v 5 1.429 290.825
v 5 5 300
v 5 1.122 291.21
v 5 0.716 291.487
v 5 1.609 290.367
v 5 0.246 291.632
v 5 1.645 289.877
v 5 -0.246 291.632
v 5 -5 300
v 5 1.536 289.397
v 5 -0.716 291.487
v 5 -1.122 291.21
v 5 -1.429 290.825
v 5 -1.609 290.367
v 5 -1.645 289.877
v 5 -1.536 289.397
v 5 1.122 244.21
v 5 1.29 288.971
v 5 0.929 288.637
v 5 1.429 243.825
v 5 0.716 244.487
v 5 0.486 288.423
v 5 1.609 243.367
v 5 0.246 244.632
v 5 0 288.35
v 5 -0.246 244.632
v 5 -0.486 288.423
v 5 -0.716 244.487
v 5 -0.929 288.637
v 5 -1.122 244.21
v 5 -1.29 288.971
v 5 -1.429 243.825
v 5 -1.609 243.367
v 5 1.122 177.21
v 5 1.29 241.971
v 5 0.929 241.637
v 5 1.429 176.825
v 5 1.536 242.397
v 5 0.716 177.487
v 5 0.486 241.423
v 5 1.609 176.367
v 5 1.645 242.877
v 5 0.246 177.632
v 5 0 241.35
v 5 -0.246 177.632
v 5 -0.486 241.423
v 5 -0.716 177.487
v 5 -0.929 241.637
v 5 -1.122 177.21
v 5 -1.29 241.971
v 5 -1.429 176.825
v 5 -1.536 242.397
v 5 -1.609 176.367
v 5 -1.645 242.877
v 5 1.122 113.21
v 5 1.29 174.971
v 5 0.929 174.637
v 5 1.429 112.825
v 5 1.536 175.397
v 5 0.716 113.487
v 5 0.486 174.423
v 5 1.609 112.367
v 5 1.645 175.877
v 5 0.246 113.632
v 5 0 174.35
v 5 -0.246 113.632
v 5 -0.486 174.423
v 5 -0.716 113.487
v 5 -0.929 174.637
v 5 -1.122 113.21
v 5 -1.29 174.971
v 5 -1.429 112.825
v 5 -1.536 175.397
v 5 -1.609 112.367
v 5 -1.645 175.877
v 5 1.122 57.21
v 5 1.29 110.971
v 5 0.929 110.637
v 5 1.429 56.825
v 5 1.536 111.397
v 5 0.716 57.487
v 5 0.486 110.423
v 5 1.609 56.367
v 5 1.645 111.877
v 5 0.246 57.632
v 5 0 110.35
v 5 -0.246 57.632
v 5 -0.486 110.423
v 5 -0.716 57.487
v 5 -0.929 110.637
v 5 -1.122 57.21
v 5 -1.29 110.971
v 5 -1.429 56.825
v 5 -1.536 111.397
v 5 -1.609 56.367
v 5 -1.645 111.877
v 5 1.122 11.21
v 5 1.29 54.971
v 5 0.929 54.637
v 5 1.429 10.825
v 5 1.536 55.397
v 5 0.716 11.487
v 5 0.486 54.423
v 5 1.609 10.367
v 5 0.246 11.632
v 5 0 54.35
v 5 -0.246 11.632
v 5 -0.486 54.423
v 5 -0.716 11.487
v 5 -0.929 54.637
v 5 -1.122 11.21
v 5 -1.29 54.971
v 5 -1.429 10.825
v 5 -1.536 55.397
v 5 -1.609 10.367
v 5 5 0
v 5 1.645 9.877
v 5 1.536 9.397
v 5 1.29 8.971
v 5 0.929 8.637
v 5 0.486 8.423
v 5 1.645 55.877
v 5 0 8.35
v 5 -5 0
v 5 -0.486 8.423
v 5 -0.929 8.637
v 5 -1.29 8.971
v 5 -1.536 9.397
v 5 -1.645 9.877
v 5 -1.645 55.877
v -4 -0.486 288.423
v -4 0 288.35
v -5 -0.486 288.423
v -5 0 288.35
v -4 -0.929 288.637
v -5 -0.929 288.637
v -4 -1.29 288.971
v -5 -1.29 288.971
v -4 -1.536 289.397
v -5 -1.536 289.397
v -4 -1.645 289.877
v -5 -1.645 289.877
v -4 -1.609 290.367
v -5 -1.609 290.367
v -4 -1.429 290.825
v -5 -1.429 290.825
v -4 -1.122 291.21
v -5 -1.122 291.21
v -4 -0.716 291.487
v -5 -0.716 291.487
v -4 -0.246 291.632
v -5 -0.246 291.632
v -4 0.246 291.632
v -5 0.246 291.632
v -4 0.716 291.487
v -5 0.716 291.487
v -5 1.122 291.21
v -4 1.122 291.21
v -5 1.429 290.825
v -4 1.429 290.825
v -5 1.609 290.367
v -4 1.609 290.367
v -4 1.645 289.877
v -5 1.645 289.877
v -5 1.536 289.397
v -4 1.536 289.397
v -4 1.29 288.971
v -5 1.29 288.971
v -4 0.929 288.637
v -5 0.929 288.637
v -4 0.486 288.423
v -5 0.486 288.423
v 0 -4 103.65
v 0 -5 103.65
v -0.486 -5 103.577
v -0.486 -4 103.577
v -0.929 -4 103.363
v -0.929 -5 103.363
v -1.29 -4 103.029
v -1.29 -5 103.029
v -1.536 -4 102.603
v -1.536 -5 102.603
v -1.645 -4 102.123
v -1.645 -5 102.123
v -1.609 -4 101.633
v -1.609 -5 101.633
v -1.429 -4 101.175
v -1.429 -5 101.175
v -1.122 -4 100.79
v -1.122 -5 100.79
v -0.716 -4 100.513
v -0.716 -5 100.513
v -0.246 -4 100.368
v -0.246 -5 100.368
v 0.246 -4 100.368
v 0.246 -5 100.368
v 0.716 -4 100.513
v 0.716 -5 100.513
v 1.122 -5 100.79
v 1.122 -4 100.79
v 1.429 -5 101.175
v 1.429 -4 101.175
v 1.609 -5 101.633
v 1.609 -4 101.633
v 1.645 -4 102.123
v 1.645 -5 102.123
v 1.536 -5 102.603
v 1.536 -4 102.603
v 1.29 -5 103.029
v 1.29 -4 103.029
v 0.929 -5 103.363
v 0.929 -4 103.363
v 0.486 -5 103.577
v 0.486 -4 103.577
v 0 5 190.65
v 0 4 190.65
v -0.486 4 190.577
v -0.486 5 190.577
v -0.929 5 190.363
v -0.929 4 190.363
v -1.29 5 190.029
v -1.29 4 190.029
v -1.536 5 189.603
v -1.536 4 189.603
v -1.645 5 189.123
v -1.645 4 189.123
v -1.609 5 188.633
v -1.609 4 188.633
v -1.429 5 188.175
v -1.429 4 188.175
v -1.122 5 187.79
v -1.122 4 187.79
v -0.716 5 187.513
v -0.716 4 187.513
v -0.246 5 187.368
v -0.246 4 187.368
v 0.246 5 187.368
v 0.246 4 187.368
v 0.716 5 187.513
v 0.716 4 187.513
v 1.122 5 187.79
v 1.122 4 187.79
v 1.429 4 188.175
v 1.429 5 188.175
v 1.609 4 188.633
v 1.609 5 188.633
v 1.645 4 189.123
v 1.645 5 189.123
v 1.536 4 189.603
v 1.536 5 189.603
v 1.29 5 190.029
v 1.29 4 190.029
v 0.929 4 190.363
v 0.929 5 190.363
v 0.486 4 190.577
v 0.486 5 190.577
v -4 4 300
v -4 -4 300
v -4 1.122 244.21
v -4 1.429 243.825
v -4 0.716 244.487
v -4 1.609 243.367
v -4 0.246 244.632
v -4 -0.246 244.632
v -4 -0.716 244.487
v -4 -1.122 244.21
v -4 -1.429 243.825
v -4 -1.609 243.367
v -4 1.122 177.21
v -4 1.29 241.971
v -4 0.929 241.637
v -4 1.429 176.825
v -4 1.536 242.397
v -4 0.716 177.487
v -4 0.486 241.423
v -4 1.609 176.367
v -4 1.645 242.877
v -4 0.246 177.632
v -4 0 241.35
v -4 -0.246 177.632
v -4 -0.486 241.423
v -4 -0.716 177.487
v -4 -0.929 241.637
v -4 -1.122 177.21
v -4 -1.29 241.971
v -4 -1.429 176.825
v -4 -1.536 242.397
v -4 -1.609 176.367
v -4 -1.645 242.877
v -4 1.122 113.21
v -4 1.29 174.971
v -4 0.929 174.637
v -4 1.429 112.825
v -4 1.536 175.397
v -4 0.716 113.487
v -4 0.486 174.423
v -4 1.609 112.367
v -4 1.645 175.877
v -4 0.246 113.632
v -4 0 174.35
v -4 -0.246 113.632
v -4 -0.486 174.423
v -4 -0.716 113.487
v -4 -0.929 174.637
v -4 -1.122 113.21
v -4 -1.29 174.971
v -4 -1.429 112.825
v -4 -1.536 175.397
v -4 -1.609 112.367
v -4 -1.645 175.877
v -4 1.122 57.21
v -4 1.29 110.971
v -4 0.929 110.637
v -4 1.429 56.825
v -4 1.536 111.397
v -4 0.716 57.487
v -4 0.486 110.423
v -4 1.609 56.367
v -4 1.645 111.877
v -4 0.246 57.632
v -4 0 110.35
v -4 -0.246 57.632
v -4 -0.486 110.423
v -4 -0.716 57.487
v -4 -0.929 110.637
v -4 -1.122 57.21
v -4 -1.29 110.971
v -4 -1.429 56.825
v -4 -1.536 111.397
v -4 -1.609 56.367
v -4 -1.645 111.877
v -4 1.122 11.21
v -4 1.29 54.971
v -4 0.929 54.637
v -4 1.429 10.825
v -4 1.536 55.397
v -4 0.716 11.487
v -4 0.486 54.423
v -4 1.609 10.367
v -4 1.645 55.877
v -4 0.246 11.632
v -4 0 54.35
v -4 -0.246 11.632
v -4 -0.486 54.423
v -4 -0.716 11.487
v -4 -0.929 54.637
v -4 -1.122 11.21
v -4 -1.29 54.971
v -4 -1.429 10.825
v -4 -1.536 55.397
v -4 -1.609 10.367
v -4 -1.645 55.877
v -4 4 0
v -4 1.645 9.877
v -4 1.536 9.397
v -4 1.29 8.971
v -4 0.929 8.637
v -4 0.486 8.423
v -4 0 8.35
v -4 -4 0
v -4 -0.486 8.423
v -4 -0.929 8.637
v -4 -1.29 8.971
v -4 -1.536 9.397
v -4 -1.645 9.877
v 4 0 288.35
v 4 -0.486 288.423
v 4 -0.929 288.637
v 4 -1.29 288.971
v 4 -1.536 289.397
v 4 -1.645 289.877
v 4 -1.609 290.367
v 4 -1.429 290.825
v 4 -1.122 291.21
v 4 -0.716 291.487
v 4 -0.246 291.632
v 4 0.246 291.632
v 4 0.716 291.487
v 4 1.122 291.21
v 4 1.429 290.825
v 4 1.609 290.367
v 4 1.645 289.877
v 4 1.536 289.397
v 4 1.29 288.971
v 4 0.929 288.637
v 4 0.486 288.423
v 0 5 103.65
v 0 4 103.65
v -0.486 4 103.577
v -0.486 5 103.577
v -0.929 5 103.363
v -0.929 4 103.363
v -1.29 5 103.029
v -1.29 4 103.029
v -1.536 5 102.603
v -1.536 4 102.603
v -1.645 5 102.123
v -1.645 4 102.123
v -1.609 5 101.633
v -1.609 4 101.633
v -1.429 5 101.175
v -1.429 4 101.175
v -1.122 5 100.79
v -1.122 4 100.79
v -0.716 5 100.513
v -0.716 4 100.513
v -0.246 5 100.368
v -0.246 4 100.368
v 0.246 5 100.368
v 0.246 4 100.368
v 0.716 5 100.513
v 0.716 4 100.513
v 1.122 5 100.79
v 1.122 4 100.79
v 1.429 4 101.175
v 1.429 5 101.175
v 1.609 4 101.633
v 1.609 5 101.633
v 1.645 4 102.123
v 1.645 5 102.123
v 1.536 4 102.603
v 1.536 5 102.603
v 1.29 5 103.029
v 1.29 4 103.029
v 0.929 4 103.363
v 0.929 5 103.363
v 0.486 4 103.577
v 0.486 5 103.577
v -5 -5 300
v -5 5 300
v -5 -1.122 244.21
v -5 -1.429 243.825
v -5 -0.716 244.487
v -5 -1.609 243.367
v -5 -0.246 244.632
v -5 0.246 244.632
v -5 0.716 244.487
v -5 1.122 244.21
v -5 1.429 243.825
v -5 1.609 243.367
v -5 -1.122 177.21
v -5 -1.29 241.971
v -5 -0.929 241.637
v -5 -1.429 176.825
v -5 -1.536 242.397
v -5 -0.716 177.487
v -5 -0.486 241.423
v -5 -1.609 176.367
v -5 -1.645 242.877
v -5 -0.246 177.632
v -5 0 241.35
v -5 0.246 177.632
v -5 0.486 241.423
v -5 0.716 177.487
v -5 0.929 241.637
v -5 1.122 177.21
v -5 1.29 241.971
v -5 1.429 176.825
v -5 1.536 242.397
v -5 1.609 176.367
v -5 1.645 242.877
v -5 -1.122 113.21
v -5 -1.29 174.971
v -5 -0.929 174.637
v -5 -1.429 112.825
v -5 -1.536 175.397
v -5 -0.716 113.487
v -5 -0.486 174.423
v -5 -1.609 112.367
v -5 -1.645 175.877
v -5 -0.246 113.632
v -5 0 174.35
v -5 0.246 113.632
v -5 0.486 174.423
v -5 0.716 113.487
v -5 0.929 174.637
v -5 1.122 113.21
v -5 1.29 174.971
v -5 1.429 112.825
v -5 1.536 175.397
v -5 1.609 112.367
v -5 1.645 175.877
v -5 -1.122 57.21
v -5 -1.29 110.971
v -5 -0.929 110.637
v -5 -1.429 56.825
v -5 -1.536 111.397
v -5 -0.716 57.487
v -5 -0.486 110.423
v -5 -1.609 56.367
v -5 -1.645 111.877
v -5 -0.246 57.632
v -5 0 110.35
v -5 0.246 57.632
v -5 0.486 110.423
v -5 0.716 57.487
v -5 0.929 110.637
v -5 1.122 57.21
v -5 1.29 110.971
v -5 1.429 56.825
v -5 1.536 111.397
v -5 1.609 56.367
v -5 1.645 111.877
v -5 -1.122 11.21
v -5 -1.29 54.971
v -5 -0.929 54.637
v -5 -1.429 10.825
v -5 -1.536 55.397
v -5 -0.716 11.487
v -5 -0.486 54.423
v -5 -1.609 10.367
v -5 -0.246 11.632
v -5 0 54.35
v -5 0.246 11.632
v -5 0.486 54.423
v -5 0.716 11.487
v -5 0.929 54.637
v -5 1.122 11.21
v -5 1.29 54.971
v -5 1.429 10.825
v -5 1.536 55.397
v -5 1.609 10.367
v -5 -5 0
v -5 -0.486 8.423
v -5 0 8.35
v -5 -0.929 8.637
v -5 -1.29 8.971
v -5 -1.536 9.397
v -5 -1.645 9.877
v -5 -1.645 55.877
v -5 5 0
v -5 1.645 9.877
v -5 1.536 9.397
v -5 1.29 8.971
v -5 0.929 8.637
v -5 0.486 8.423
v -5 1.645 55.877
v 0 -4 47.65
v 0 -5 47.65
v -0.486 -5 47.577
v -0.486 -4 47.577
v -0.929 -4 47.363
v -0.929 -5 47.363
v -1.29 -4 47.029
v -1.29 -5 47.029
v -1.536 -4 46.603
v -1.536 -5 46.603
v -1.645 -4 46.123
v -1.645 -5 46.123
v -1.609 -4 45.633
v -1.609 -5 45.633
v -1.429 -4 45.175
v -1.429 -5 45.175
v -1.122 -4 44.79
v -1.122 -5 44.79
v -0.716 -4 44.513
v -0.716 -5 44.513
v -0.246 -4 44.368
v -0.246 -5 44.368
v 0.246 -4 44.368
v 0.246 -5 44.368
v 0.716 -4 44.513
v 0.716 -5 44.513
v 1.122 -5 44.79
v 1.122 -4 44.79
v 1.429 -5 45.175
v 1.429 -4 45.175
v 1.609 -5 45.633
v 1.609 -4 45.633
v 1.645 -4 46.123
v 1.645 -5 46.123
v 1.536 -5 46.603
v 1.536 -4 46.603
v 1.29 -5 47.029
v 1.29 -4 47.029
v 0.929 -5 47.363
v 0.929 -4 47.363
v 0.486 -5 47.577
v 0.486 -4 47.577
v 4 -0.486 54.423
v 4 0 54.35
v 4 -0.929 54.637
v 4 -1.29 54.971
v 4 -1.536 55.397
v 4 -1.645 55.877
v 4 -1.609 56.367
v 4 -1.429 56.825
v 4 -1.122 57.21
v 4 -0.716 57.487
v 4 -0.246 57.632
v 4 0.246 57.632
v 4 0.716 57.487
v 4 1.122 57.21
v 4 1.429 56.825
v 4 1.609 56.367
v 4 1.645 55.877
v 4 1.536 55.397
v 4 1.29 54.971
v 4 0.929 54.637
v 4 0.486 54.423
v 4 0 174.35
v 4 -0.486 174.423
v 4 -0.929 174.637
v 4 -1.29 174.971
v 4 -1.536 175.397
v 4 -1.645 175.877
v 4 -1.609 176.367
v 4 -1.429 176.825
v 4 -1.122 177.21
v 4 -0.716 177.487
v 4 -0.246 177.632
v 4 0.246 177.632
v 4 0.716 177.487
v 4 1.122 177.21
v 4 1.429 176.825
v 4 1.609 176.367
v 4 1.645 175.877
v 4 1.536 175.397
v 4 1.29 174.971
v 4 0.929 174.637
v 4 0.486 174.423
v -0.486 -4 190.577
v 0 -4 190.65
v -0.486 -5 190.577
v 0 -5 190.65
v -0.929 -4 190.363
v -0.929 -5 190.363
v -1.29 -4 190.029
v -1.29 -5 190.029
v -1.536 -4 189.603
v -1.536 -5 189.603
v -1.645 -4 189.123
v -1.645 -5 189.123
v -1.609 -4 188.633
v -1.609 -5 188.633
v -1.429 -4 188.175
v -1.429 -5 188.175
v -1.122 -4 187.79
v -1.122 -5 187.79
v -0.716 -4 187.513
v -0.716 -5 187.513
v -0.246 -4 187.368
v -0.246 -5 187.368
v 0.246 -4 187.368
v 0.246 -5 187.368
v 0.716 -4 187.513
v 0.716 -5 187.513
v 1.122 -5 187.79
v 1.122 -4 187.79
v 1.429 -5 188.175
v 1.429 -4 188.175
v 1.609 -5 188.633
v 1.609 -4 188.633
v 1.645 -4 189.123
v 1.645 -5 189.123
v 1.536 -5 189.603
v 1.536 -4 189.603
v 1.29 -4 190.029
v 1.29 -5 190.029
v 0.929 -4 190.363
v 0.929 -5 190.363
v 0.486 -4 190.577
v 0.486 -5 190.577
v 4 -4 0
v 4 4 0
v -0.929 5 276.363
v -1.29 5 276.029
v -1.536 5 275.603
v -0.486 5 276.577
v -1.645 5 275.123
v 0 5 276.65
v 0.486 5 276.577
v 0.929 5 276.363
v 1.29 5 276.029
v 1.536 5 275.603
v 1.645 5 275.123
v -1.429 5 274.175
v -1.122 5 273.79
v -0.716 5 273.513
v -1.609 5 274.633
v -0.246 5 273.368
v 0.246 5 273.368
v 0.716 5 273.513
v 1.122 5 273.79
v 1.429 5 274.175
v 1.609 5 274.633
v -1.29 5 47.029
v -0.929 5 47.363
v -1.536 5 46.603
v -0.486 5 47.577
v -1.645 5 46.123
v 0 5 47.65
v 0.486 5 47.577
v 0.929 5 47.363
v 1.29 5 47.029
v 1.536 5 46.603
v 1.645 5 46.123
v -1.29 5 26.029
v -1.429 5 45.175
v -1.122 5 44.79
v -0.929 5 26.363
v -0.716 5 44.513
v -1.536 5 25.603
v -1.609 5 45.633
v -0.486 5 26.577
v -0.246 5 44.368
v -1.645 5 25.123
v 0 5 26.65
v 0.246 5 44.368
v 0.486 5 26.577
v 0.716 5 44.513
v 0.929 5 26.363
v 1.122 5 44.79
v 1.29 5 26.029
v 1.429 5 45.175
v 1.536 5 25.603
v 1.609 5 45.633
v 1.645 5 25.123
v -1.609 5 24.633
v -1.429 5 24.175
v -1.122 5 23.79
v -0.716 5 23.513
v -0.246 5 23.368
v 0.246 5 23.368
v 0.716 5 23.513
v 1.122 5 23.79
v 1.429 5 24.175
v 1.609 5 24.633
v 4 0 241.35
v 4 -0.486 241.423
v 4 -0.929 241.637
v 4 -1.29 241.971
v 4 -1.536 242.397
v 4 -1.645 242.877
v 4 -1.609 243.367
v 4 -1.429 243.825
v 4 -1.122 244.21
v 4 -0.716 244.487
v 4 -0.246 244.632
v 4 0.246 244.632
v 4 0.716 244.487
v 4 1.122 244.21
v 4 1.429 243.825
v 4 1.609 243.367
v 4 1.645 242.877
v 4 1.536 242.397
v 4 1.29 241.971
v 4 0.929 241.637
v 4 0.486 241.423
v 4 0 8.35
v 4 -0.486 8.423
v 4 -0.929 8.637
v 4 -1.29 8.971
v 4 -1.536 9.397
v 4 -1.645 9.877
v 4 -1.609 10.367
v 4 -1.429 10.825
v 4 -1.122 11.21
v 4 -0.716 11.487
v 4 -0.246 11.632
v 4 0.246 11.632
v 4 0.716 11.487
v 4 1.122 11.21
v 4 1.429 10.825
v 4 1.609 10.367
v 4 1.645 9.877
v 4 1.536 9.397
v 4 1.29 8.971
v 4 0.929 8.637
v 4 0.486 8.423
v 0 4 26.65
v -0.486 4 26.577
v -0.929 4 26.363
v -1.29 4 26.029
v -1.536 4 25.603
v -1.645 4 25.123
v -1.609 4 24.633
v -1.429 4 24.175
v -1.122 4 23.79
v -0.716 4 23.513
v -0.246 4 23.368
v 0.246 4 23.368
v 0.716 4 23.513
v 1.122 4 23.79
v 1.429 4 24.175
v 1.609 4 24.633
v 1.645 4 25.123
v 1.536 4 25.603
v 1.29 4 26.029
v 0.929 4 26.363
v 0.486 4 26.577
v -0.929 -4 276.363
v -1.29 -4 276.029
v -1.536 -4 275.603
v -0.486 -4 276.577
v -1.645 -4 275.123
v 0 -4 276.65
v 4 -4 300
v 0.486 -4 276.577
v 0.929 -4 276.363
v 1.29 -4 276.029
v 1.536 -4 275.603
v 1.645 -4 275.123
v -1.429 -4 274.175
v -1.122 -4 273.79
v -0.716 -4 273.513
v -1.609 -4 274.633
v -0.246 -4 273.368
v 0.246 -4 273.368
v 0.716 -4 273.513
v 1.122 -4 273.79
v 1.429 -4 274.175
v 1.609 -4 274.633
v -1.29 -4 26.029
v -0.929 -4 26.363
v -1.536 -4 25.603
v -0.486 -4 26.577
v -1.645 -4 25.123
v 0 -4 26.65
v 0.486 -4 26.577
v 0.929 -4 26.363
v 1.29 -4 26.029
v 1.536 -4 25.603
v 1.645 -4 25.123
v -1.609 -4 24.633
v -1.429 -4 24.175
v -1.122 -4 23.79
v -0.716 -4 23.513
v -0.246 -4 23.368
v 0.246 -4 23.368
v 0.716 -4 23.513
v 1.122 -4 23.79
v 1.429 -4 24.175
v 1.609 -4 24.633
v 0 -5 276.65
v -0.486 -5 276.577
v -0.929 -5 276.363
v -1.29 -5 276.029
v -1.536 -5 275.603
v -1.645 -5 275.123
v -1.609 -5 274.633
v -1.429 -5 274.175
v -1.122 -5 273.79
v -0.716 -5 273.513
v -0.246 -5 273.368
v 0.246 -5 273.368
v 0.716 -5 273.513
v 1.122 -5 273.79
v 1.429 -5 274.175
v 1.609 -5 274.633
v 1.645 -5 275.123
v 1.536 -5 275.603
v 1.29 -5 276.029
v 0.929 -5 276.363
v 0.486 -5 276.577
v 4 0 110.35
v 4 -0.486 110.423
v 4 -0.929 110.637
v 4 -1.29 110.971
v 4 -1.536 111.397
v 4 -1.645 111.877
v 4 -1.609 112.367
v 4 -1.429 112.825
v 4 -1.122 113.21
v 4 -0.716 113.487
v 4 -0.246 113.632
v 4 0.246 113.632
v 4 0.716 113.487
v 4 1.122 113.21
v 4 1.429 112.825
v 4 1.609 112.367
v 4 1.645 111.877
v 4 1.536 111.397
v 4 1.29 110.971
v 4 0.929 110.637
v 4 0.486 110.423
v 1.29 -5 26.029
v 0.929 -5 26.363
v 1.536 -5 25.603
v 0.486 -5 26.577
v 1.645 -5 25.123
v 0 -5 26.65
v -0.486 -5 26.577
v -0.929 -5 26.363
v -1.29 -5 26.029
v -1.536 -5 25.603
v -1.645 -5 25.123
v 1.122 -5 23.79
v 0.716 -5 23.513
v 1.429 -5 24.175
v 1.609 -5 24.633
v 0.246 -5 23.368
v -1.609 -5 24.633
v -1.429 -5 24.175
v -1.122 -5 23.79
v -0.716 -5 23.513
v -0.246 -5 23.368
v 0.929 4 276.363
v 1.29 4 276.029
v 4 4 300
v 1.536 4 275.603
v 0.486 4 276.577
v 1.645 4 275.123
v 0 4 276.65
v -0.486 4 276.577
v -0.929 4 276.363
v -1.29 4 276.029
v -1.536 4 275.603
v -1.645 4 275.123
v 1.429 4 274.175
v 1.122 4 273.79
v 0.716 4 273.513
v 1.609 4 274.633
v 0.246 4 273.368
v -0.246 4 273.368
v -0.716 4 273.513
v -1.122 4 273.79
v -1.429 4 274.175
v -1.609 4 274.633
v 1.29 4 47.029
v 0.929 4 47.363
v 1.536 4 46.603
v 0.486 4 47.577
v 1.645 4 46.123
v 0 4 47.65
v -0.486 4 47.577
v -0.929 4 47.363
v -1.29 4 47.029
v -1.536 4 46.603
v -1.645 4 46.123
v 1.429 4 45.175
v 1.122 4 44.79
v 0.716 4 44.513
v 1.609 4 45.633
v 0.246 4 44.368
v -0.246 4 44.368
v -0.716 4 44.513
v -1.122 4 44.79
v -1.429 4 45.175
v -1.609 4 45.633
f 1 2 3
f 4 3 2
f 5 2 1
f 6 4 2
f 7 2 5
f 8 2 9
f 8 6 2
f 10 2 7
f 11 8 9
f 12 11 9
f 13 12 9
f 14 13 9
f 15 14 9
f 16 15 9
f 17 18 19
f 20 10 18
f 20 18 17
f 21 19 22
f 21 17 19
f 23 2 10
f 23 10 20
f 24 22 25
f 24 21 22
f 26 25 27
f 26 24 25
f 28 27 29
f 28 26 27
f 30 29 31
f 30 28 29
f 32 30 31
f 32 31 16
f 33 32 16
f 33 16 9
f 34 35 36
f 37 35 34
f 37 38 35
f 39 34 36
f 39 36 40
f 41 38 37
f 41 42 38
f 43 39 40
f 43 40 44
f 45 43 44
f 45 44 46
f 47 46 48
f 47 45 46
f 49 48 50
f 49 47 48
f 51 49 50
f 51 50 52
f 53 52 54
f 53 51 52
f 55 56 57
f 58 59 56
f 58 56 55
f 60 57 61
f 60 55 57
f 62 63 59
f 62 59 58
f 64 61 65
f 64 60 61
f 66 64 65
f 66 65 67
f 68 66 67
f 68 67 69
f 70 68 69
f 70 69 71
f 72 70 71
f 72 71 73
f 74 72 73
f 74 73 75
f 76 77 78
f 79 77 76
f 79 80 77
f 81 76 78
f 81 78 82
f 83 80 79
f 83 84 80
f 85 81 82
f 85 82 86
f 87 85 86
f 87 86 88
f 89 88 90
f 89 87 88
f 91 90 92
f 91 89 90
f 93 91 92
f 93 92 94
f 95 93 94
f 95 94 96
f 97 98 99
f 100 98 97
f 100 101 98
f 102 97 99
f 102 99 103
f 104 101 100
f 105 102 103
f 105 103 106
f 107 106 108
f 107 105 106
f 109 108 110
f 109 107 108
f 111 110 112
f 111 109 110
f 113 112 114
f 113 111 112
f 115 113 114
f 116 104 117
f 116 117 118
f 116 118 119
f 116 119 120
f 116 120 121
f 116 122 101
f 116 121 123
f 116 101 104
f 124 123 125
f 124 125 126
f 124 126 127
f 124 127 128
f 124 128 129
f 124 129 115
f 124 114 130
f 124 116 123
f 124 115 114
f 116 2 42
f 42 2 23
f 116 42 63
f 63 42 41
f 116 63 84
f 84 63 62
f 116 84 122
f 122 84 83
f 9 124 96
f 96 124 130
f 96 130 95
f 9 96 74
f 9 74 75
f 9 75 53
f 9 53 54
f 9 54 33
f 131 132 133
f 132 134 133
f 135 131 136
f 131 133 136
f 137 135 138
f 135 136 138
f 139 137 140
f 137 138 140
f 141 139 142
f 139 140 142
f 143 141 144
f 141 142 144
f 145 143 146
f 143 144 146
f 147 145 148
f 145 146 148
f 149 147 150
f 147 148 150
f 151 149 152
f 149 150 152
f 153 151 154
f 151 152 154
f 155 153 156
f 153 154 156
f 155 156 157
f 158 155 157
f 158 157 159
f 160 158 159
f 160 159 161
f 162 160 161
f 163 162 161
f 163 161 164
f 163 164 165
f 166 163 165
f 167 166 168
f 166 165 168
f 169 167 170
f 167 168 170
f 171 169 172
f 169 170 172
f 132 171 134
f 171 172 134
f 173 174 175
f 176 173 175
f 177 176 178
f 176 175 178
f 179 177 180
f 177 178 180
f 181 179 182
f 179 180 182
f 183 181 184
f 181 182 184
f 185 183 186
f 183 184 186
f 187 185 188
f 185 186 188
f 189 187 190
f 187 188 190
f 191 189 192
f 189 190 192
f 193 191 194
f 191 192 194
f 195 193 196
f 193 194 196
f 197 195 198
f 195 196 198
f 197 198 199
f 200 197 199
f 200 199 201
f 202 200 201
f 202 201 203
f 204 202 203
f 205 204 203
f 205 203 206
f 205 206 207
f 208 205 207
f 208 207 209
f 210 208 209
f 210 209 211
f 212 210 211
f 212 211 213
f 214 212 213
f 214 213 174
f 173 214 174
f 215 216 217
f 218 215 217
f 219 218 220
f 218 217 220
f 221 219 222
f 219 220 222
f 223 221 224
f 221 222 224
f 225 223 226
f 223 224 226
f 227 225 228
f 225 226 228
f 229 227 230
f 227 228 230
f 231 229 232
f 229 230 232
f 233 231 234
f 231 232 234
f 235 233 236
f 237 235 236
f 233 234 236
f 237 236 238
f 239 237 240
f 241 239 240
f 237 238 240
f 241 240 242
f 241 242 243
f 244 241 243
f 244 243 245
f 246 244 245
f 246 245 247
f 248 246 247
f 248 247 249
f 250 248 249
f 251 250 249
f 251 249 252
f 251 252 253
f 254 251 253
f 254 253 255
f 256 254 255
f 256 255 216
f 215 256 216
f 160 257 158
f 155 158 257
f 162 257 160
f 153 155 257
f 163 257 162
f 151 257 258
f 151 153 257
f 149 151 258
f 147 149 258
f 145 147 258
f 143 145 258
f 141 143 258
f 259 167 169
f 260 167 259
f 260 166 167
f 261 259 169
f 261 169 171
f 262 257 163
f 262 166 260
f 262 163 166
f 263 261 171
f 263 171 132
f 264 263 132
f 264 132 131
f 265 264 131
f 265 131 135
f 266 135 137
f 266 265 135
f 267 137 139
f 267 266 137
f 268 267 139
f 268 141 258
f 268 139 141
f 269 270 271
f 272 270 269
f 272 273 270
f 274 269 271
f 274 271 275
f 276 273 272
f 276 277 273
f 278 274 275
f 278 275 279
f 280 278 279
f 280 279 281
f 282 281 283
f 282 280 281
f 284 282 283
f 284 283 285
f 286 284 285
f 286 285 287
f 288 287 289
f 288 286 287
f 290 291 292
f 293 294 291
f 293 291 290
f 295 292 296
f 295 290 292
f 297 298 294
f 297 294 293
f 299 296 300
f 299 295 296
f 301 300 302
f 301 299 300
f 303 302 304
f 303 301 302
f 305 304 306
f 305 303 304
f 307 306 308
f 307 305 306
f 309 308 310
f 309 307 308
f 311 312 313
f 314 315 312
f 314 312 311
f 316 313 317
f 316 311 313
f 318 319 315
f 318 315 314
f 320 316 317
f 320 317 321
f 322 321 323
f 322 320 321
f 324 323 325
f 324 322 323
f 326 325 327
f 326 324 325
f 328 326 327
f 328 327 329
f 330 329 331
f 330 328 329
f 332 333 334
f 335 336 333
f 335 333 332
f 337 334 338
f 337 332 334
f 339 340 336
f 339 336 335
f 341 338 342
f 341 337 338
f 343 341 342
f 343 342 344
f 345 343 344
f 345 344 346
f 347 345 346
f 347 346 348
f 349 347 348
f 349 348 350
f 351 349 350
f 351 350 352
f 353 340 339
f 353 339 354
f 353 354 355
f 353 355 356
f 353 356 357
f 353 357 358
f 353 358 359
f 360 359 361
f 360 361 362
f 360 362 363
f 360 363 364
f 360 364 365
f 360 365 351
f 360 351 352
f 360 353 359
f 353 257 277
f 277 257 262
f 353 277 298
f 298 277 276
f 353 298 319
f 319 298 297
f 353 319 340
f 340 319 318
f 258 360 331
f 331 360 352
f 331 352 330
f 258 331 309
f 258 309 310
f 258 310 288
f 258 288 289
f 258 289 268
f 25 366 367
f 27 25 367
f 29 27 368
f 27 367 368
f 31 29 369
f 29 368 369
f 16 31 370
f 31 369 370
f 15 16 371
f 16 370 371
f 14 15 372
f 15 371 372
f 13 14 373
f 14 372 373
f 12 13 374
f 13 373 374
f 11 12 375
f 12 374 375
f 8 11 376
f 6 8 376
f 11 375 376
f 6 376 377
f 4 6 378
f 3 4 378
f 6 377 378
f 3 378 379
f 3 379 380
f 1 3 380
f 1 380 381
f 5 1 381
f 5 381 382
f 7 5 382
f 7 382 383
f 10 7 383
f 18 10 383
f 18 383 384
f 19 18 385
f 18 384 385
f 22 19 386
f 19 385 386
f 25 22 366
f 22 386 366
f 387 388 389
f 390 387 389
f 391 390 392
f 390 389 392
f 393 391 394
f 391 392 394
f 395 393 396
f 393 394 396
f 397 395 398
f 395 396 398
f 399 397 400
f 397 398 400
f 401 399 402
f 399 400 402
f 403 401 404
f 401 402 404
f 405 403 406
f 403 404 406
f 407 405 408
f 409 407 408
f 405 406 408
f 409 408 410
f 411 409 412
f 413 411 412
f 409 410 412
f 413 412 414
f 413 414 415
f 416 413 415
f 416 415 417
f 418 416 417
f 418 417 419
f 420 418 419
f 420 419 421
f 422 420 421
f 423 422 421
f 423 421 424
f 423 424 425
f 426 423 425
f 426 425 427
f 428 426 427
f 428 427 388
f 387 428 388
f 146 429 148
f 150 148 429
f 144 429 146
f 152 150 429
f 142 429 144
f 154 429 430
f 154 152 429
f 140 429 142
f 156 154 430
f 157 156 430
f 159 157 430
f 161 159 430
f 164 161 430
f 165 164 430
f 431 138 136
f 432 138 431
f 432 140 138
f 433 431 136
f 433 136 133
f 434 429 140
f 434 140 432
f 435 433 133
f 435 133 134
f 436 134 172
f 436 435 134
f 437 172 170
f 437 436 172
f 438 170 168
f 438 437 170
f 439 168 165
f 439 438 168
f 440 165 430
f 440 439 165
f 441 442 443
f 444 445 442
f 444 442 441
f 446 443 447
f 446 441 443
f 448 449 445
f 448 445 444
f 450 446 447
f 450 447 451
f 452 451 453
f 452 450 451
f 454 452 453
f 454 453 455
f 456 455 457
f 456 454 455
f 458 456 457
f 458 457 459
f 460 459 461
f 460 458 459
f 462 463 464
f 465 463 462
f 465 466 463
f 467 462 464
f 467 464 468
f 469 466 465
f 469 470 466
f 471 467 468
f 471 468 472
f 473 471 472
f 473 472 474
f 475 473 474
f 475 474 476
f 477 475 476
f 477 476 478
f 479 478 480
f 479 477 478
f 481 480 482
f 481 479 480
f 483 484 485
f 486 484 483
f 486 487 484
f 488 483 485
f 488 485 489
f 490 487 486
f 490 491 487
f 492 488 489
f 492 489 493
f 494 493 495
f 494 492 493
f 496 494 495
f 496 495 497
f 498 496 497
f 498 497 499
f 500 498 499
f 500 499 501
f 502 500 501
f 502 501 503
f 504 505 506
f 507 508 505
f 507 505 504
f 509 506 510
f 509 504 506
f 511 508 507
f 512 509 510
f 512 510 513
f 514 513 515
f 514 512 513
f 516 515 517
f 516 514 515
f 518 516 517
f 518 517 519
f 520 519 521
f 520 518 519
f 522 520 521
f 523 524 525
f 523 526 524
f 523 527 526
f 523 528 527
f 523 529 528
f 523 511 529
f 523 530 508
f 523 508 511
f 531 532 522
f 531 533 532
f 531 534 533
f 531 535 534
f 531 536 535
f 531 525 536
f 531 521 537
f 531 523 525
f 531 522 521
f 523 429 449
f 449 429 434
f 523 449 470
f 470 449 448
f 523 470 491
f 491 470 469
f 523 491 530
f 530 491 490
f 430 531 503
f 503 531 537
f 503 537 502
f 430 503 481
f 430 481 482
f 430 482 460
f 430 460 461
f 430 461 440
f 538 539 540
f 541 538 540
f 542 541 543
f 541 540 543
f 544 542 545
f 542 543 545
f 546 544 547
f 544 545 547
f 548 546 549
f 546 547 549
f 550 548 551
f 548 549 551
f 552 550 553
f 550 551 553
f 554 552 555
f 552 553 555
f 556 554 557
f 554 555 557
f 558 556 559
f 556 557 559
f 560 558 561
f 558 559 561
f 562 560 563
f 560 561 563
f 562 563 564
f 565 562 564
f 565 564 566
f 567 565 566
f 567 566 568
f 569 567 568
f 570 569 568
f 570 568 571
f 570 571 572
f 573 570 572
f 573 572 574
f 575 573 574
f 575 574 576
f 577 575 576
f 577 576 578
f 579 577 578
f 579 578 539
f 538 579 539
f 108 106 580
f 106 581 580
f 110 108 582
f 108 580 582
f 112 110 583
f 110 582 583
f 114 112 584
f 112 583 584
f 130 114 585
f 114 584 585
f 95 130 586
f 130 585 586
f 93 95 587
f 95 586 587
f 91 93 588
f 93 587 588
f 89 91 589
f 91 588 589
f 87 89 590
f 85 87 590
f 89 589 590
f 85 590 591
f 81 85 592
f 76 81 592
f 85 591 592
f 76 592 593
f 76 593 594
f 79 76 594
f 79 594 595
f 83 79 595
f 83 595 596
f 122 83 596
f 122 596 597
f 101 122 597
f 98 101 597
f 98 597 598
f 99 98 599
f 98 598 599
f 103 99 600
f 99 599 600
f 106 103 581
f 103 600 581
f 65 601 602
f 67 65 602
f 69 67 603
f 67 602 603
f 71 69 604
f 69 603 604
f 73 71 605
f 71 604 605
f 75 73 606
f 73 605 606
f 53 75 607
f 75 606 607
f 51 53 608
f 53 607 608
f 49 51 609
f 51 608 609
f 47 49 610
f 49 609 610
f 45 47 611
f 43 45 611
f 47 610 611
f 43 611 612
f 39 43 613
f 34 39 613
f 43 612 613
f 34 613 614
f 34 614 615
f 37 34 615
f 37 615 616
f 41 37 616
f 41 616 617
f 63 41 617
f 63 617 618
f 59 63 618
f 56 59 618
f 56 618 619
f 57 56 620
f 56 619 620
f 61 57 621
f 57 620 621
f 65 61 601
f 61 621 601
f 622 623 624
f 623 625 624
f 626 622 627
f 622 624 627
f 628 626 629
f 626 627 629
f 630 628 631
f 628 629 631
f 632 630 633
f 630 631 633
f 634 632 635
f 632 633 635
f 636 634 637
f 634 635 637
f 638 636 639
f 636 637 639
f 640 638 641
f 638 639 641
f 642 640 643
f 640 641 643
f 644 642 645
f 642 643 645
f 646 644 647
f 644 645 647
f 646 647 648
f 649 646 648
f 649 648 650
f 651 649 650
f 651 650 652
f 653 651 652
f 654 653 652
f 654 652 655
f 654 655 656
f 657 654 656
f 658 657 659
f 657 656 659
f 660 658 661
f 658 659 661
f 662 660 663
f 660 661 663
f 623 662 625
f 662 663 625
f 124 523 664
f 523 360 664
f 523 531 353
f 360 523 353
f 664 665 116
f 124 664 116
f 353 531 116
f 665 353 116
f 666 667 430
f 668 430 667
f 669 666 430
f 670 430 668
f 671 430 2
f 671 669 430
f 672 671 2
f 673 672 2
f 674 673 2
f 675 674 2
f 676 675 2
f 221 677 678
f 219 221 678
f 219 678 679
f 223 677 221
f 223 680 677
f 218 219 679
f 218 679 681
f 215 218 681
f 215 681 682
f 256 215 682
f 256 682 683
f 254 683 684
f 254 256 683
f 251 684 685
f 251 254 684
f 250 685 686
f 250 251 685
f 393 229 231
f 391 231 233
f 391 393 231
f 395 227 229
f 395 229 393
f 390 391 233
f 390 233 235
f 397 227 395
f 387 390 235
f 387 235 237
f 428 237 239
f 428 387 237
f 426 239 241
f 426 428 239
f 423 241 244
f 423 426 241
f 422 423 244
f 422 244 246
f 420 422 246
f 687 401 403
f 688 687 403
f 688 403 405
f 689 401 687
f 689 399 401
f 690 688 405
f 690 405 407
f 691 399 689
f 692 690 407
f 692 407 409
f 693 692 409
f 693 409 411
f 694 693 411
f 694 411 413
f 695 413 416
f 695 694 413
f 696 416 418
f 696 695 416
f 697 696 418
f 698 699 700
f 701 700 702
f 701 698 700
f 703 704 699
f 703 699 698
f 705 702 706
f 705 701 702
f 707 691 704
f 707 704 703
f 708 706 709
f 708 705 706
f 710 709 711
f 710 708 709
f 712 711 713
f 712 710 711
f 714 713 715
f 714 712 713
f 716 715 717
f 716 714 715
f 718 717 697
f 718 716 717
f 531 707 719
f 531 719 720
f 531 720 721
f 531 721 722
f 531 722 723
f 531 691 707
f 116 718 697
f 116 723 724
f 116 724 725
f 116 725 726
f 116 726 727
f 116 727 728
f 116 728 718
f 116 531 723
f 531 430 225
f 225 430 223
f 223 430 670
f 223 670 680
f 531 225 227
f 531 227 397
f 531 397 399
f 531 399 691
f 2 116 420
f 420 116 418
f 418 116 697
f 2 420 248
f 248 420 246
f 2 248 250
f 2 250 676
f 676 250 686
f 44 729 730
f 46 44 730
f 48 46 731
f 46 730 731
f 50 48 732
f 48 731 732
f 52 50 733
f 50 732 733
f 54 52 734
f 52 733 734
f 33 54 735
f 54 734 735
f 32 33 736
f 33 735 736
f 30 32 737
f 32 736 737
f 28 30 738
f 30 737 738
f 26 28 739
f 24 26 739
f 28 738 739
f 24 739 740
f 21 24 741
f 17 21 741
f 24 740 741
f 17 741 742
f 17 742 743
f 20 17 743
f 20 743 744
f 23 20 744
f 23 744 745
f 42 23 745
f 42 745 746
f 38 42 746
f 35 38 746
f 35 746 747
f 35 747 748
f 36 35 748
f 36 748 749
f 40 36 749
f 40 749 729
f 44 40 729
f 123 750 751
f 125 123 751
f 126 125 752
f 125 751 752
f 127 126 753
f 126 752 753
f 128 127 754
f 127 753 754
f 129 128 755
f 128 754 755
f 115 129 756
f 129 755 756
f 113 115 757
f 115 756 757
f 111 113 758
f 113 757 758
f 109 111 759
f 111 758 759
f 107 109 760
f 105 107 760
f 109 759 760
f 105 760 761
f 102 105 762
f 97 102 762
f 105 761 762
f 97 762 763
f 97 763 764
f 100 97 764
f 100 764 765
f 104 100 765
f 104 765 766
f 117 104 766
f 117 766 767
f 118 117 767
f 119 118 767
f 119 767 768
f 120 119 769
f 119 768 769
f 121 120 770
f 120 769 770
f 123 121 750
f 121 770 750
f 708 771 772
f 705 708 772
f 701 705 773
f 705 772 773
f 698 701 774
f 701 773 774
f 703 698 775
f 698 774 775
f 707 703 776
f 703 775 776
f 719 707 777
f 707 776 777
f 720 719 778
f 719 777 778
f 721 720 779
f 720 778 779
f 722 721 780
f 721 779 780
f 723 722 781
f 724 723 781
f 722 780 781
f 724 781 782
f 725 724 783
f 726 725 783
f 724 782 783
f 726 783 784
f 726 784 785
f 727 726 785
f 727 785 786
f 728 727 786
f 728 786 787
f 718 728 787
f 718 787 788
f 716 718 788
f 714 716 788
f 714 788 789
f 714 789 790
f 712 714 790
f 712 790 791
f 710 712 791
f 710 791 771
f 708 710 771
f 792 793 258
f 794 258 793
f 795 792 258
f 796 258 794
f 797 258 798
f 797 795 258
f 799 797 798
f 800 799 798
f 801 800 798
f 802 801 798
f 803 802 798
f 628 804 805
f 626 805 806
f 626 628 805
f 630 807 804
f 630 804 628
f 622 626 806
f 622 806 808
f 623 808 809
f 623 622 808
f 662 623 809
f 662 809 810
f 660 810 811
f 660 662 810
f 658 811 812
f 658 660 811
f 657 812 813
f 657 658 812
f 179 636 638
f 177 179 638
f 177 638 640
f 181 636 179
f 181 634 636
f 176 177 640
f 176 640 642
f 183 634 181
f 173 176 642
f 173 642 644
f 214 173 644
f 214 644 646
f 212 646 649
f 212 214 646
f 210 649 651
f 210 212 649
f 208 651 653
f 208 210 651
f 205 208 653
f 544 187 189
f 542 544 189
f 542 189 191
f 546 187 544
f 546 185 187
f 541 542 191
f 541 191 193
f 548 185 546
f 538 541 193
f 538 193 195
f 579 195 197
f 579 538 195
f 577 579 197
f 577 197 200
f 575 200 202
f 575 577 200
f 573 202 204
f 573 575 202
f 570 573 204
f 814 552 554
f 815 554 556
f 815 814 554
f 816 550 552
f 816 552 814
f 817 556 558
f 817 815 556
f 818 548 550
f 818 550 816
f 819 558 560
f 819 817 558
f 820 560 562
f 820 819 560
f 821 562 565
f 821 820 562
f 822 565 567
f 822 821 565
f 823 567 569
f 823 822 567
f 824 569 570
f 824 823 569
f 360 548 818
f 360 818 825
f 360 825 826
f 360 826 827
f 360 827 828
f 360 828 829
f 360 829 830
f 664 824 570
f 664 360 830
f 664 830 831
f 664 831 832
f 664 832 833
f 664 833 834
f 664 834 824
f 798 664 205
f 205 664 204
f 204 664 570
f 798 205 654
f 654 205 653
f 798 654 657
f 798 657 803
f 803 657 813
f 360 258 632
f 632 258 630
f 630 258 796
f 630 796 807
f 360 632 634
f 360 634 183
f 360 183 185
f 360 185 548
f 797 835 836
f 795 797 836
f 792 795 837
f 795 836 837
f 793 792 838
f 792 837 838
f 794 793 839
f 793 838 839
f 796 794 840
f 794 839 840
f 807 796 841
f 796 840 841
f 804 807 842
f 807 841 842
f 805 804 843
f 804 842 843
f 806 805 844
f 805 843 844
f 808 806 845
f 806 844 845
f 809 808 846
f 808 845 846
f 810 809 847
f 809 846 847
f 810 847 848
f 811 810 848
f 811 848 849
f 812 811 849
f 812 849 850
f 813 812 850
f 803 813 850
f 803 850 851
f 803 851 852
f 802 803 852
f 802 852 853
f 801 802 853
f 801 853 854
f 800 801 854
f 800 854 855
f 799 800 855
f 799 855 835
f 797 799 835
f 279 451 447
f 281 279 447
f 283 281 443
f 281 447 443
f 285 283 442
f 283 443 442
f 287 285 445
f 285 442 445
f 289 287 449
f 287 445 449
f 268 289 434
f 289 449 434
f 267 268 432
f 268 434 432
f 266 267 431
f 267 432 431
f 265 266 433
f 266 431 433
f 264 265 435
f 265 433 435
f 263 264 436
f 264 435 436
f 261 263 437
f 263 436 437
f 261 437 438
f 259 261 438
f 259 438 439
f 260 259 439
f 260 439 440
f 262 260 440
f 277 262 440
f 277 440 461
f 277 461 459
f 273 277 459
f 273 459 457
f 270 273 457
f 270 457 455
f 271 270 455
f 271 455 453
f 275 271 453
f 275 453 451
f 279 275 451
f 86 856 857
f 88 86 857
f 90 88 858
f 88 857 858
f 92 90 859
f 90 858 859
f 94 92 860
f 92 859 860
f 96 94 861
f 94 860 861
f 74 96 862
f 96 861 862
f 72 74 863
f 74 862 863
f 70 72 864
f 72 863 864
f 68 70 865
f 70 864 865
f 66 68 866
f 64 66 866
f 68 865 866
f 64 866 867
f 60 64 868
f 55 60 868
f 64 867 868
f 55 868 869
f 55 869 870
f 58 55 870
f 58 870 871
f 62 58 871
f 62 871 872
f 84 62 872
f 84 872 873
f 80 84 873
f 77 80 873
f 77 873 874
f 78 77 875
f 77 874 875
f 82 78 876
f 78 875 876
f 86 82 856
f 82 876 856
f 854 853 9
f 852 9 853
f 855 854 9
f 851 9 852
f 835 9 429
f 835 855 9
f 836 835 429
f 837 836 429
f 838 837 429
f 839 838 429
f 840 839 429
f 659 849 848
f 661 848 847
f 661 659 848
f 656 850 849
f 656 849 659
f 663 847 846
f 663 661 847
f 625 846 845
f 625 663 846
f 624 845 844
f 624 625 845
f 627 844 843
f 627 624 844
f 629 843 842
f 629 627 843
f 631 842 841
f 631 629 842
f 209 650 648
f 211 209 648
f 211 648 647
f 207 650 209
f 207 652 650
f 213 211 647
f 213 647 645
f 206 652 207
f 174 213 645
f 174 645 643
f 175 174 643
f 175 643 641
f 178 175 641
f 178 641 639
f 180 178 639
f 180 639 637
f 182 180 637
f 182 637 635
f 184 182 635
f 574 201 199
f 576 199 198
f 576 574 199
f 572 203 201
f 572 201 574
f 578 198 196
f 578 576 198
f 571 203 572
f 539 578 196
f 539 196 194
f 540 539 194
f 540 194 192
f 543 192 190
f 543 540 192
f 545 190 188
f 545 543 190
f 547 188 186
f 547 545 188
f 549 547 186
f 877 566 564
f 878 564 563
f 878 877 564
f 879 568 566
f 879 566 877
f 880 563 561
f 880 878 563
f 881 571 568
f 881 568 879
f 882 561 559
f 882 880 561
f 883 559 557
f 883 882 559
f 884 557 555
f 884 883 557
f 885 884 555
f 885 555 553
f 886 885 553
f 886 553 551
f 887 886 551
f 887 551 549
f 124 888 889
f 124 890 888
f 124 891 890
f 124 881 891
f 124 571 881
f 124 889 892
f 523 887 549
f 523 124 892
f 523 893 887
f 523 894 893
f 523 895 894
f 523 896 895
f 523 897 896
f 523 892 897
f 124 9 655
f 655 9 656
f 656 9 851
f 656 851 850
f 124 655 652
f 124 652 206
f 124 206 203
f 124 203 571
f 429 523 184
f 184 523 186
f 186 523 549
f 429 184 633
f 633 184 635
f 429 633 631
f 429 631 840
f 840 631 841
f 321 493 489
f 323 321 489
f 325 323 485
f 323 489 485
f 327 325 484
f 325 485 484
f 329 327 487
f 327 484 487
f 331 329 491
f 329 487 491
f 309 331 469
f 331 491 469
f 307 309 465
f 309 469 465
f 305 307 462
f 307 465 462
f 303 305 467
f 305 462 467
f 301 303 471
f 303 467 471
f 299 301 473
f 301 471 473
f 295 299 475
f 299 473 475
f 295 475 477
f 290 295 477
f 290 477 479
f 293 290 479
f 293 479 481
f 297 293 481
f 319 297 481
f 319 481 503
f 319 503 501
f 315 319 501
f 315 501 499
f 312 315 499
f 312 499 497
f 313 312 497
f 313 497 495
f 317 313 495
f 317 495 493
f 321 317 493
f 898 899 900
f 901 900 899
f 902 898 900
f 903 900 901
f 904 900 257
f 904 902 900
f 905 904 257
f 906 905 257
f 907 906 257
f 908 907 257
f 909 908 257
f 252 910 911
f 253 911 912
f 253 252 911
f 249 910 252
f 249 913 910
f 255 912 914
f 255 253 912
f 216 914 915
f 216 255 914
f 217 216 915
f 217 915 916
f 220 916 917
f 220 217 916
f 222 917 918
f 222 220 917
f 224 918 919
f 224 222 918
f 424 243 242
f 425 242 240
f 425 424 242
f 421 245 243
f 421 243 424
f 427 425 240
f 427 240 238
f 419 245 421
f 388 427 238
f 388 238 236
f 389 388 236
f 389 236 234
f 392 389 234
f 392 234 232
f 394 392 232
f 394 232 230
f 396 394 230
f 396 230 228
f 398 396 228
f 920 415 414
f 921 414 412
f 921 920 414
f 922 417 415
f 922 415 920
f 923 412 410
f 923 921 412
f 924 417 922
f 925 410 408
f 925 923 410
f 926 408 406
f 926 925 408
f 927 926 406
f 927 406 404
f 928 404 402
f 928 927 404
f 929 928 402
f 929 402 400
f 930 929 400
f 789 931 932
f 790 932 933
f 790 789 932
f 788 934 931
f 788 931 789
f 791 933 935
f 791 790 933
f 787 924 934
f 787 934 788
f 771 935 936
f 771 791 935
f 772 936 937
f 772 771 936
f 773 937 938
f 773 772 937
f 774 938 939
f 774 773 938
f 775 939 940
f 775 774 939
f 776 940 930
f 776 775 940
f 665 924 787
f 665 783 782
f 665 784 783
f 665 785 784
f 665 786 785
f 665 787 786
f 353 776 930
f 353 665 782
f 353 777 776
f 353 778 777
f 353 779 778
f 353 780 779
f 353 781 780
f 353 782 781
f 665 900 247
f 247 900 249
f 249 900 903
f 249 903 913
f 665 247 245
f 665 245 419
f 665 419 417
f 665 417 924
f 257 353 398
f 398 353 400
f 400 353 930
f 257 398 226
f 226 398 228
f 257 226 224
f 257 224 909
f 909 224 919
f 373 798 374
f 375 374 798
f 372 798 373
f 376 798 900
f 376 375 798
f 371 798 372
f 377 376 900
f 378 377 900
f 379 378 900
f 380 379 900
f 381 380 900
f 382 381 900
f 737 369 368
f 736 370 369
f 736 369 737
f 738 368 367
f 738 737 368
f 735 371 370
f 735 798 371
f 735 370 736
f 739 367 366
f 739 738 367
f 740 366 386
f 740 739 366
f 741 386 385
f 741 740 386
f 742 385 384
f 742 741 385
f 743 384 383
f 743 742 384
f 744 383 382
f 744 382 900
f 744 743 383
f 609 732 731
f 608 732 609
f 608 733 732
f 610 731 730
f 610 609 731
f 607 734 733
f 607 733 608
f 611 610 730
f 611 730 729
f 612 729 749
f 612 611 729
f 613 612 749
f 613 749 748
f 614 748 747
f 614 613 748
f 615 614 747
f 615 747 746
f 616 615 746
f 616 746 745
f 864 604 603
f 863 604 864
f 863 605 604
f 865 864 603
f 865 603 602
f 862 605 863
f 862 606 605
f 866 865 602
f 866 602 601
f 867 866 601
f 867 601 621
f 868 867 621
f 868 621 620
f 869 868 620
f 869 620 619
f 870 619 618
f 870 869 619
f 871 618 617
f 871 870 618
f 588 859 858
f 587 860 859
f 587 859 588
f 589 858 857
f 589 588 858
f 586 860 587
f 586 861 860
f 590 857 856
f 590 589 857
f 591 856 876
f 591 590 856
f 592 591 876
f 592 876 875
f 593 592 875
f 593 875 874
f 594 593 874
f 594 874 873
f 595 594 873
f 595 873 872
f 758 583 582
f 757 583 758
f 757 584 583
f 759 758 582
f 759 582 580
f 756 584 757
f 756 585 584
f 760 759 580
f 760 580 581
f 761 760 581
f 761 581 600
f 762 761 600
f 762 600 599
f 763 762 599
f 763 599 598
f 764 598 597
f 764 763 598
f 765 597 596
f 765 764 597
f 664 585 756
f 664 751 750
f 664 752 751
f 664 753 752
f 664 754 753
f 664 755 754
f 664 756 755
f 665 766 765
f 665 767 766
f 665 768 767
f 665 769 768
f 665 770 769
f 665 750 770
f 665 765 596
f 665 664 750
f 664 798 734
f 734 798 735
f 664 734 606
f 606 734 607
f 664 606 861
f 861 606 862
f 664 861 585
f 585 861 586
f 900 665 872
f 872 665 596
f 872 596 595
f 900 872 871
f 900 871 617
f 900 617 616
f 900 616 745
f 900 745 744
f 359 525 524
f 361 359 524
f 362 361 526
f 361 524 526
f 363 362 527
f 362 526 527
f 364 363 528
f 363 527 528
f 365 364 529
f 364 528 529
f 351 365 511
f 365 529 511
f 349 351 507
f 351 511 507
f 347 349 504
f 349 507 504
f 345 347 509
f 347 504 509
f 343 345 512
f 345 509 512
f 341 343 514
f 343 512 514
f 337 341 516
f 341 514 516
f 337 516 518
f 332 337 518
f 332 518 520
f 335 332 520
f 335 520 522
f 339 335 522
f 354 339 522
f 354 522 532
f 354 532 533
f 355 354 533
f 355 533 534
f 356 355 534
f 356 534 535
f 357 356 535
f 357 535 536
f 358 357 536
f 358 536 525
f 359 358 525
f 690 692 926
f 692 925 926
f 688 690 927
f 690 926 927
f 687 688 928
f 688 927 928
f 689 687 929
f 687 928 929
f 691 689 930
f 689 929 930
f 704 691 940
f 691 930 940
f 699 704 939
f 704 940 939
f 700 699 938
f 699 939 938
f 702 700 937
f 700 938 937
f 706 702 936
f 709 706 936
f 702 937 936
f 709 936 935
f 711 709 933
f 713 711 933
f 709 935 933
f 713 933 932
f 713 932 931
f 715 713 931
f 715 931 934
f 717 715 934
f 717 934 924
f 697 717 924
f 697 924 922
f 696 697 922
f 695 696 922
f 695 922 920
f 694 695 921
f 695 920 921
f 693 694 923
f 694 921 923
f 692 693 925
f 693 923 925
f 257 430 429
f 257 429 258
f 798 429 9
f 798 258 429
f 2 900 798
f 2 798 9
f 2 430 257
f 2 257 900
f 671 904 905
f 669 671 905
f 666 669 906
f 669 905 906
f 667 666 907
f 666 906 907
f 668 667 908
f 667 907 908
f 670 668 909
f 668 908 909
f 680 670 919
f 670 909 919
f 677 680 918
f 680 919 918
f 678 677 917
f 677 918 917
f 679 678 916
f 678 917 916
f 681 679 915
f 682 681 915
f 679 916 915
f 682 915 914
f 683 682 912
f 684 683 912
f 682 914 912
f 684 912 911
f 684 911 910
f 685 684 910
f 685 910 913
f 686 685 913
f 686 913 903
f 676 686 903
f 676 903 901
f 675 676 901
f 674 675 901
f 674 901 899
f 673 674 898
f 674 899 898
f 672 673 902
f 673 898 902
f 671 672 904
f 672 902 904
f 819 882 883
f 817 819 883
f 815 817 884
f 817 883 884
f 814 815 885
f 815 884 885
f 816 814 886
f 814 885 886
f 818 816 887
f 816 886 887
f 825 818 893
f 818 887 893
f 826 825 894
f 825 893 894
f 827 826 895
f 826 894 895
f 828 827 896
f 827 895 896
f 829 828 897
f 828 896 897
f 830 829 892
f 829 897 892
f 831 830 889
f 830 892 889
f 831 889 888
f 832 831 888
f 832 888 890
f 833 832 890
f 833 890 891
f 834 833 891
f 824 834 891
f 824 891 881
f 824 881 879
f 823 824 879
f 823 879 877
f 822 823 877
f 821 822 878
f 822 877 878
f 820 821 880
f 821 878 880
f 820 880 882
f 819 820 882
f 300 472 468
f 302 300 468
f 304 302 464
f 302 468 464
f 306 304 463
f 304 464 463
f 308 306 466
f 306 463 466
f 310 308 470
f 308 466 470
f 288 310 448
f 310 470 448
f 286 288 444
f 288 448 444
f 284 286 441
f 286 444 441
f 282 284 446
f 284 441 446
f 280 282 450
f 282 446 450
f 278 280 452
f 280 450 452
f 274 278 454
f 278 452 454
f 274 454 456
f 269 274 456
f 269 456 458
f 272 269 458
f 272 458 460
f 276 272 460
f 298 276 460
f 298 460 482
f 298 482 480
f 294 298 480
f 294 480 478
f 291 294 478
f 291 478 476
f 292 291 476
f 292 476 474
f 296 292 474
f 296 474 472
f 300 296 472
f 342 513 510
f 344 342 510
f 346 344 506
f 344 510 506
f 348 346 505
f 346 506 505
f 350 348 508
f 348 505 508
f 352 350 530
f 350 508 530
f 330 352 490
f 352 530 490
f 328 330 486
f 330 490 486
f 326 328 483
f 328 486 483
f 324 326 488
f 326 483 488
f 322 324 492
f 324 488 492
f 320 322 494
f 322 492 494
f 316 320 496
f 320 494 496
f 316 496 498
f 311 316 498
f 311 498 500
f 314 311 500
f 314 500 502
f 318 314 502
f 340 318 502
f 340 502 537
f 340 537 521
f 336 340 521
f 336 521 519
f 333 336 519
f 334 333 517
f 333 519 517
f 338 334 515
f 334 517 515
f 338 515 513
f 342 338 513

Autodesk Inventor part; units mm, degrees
ref_plane "YZ Plane" through (0, 0, 0) normal (1, 0, 0) x (0, 1, 0)
ref_plane "XZ Plane" through (0, 0, 0) normal (0, 1, 0) x (-1, 0, 0)
ref_plane "XY Plane" through (0, 0, 0) normal (0, 0, 1) x (1, 0, 0)
sketch "スケッチ1" plane through (0, 0, 0) normal (0, 0, 1) x (1, 0, 0)
  line L0 (5, -5) -> (-5, -5)
  line L1 (-5, -5) -> (-5, 5)
  line L2 (-5, 5) -> (5, 5)
  line L3 (5, 5) -> (5, -5)
  line L4 (5, -5) -> (-5, 5) construction
  line L5 (-5, -5) -> (5, 5) construction
  line L6 (4, 4) -> (-4, 4)
  line L7 (-4, 4) -> (-4, -4)
  line L8 (-4, -4) -> (4, -4)
  line L9 (4, -4) -> (4, 4)
  point P0 (0, 0)
  dimension "d0" = 10
  dimension "d1" = 10
  dimension "d2" = 1
extrude "押し出し1" add sketch "スケッチ1" along normal blind 300
sketch "スケッチ2" plane through (5, -5, 0) normal (1, 0, 0) x (0, 0, -1)
  line L0 (0, 0) -> (0, 10) projected
  line L1 (0, 10) -> (-300, 10) projected
  line L2 (-300, 0) -> (-300, 10) projected
  line L3 (0, 0) -> (-300, 0) projected
  line L4 (0, 5) -> (-300, 5)
  line L5 (-300, 0) -> (-300, 10) projected
  point P0 (-290, 5)
  point P1 (-176, 5)
  point P2 (-56, 5)
  point P3 (-10, 5)
  point P4 (-112, 5)
  point P5 (-243, 5)
  point P6 (-149.5, 5)
  dimension "d7" = 120
  dimension "d25" = 10
  dimension "d26" = 46
  dimension "d27" = 10
  dimension "d28" = 114
  dimension "d29" = 56
  dimension "d34" = 26.5
  dimension "d35" = 93.5
  dimension "d36" = 93.5
hole "穴1" at (5, 0, 290) at (5, 0, 176) at (5, 0, 56) at (5, 0, 10) at (5, 0, 112) at (5, 0, 243) direction (-1, 0, 0) diameter 3.3 end through all
sketch "スケッチ3" plane through (-5, 5, 0) normal (0, 1, 0) x (1, 0, 0)
  line L0 (10, 0) -> (0, 0) projected
  line L1 (0, 0) -> (0, -300) projected
  line L2 (10, -300) -> (0, -300) projected
  line L3 (10, 0) -> (10, -300) projected
  line L4 (5, -300) -> (5, 0)
  point P0 (5, -275)
  point P1 (5, -46)
  point P2 (5, -102)
  point P3 (5, -189)
  point P4 (5, -25)
  dimension "d17" = 25
  dimension "d30" = 46
  dimension "d31" = 56
  dimension "d32" = 87
  dimension "d33" = 25
hole "穴2" at (0, 5, 275) at (0, 5, 46) at (0, 5, 102) at (0, 5, 189) at (0, 5, 25) direction (0, -1, 0) diameter 3.3 end through all
equation "\"d35\" = d36"
properties part number "small_kaku_1010_200"
